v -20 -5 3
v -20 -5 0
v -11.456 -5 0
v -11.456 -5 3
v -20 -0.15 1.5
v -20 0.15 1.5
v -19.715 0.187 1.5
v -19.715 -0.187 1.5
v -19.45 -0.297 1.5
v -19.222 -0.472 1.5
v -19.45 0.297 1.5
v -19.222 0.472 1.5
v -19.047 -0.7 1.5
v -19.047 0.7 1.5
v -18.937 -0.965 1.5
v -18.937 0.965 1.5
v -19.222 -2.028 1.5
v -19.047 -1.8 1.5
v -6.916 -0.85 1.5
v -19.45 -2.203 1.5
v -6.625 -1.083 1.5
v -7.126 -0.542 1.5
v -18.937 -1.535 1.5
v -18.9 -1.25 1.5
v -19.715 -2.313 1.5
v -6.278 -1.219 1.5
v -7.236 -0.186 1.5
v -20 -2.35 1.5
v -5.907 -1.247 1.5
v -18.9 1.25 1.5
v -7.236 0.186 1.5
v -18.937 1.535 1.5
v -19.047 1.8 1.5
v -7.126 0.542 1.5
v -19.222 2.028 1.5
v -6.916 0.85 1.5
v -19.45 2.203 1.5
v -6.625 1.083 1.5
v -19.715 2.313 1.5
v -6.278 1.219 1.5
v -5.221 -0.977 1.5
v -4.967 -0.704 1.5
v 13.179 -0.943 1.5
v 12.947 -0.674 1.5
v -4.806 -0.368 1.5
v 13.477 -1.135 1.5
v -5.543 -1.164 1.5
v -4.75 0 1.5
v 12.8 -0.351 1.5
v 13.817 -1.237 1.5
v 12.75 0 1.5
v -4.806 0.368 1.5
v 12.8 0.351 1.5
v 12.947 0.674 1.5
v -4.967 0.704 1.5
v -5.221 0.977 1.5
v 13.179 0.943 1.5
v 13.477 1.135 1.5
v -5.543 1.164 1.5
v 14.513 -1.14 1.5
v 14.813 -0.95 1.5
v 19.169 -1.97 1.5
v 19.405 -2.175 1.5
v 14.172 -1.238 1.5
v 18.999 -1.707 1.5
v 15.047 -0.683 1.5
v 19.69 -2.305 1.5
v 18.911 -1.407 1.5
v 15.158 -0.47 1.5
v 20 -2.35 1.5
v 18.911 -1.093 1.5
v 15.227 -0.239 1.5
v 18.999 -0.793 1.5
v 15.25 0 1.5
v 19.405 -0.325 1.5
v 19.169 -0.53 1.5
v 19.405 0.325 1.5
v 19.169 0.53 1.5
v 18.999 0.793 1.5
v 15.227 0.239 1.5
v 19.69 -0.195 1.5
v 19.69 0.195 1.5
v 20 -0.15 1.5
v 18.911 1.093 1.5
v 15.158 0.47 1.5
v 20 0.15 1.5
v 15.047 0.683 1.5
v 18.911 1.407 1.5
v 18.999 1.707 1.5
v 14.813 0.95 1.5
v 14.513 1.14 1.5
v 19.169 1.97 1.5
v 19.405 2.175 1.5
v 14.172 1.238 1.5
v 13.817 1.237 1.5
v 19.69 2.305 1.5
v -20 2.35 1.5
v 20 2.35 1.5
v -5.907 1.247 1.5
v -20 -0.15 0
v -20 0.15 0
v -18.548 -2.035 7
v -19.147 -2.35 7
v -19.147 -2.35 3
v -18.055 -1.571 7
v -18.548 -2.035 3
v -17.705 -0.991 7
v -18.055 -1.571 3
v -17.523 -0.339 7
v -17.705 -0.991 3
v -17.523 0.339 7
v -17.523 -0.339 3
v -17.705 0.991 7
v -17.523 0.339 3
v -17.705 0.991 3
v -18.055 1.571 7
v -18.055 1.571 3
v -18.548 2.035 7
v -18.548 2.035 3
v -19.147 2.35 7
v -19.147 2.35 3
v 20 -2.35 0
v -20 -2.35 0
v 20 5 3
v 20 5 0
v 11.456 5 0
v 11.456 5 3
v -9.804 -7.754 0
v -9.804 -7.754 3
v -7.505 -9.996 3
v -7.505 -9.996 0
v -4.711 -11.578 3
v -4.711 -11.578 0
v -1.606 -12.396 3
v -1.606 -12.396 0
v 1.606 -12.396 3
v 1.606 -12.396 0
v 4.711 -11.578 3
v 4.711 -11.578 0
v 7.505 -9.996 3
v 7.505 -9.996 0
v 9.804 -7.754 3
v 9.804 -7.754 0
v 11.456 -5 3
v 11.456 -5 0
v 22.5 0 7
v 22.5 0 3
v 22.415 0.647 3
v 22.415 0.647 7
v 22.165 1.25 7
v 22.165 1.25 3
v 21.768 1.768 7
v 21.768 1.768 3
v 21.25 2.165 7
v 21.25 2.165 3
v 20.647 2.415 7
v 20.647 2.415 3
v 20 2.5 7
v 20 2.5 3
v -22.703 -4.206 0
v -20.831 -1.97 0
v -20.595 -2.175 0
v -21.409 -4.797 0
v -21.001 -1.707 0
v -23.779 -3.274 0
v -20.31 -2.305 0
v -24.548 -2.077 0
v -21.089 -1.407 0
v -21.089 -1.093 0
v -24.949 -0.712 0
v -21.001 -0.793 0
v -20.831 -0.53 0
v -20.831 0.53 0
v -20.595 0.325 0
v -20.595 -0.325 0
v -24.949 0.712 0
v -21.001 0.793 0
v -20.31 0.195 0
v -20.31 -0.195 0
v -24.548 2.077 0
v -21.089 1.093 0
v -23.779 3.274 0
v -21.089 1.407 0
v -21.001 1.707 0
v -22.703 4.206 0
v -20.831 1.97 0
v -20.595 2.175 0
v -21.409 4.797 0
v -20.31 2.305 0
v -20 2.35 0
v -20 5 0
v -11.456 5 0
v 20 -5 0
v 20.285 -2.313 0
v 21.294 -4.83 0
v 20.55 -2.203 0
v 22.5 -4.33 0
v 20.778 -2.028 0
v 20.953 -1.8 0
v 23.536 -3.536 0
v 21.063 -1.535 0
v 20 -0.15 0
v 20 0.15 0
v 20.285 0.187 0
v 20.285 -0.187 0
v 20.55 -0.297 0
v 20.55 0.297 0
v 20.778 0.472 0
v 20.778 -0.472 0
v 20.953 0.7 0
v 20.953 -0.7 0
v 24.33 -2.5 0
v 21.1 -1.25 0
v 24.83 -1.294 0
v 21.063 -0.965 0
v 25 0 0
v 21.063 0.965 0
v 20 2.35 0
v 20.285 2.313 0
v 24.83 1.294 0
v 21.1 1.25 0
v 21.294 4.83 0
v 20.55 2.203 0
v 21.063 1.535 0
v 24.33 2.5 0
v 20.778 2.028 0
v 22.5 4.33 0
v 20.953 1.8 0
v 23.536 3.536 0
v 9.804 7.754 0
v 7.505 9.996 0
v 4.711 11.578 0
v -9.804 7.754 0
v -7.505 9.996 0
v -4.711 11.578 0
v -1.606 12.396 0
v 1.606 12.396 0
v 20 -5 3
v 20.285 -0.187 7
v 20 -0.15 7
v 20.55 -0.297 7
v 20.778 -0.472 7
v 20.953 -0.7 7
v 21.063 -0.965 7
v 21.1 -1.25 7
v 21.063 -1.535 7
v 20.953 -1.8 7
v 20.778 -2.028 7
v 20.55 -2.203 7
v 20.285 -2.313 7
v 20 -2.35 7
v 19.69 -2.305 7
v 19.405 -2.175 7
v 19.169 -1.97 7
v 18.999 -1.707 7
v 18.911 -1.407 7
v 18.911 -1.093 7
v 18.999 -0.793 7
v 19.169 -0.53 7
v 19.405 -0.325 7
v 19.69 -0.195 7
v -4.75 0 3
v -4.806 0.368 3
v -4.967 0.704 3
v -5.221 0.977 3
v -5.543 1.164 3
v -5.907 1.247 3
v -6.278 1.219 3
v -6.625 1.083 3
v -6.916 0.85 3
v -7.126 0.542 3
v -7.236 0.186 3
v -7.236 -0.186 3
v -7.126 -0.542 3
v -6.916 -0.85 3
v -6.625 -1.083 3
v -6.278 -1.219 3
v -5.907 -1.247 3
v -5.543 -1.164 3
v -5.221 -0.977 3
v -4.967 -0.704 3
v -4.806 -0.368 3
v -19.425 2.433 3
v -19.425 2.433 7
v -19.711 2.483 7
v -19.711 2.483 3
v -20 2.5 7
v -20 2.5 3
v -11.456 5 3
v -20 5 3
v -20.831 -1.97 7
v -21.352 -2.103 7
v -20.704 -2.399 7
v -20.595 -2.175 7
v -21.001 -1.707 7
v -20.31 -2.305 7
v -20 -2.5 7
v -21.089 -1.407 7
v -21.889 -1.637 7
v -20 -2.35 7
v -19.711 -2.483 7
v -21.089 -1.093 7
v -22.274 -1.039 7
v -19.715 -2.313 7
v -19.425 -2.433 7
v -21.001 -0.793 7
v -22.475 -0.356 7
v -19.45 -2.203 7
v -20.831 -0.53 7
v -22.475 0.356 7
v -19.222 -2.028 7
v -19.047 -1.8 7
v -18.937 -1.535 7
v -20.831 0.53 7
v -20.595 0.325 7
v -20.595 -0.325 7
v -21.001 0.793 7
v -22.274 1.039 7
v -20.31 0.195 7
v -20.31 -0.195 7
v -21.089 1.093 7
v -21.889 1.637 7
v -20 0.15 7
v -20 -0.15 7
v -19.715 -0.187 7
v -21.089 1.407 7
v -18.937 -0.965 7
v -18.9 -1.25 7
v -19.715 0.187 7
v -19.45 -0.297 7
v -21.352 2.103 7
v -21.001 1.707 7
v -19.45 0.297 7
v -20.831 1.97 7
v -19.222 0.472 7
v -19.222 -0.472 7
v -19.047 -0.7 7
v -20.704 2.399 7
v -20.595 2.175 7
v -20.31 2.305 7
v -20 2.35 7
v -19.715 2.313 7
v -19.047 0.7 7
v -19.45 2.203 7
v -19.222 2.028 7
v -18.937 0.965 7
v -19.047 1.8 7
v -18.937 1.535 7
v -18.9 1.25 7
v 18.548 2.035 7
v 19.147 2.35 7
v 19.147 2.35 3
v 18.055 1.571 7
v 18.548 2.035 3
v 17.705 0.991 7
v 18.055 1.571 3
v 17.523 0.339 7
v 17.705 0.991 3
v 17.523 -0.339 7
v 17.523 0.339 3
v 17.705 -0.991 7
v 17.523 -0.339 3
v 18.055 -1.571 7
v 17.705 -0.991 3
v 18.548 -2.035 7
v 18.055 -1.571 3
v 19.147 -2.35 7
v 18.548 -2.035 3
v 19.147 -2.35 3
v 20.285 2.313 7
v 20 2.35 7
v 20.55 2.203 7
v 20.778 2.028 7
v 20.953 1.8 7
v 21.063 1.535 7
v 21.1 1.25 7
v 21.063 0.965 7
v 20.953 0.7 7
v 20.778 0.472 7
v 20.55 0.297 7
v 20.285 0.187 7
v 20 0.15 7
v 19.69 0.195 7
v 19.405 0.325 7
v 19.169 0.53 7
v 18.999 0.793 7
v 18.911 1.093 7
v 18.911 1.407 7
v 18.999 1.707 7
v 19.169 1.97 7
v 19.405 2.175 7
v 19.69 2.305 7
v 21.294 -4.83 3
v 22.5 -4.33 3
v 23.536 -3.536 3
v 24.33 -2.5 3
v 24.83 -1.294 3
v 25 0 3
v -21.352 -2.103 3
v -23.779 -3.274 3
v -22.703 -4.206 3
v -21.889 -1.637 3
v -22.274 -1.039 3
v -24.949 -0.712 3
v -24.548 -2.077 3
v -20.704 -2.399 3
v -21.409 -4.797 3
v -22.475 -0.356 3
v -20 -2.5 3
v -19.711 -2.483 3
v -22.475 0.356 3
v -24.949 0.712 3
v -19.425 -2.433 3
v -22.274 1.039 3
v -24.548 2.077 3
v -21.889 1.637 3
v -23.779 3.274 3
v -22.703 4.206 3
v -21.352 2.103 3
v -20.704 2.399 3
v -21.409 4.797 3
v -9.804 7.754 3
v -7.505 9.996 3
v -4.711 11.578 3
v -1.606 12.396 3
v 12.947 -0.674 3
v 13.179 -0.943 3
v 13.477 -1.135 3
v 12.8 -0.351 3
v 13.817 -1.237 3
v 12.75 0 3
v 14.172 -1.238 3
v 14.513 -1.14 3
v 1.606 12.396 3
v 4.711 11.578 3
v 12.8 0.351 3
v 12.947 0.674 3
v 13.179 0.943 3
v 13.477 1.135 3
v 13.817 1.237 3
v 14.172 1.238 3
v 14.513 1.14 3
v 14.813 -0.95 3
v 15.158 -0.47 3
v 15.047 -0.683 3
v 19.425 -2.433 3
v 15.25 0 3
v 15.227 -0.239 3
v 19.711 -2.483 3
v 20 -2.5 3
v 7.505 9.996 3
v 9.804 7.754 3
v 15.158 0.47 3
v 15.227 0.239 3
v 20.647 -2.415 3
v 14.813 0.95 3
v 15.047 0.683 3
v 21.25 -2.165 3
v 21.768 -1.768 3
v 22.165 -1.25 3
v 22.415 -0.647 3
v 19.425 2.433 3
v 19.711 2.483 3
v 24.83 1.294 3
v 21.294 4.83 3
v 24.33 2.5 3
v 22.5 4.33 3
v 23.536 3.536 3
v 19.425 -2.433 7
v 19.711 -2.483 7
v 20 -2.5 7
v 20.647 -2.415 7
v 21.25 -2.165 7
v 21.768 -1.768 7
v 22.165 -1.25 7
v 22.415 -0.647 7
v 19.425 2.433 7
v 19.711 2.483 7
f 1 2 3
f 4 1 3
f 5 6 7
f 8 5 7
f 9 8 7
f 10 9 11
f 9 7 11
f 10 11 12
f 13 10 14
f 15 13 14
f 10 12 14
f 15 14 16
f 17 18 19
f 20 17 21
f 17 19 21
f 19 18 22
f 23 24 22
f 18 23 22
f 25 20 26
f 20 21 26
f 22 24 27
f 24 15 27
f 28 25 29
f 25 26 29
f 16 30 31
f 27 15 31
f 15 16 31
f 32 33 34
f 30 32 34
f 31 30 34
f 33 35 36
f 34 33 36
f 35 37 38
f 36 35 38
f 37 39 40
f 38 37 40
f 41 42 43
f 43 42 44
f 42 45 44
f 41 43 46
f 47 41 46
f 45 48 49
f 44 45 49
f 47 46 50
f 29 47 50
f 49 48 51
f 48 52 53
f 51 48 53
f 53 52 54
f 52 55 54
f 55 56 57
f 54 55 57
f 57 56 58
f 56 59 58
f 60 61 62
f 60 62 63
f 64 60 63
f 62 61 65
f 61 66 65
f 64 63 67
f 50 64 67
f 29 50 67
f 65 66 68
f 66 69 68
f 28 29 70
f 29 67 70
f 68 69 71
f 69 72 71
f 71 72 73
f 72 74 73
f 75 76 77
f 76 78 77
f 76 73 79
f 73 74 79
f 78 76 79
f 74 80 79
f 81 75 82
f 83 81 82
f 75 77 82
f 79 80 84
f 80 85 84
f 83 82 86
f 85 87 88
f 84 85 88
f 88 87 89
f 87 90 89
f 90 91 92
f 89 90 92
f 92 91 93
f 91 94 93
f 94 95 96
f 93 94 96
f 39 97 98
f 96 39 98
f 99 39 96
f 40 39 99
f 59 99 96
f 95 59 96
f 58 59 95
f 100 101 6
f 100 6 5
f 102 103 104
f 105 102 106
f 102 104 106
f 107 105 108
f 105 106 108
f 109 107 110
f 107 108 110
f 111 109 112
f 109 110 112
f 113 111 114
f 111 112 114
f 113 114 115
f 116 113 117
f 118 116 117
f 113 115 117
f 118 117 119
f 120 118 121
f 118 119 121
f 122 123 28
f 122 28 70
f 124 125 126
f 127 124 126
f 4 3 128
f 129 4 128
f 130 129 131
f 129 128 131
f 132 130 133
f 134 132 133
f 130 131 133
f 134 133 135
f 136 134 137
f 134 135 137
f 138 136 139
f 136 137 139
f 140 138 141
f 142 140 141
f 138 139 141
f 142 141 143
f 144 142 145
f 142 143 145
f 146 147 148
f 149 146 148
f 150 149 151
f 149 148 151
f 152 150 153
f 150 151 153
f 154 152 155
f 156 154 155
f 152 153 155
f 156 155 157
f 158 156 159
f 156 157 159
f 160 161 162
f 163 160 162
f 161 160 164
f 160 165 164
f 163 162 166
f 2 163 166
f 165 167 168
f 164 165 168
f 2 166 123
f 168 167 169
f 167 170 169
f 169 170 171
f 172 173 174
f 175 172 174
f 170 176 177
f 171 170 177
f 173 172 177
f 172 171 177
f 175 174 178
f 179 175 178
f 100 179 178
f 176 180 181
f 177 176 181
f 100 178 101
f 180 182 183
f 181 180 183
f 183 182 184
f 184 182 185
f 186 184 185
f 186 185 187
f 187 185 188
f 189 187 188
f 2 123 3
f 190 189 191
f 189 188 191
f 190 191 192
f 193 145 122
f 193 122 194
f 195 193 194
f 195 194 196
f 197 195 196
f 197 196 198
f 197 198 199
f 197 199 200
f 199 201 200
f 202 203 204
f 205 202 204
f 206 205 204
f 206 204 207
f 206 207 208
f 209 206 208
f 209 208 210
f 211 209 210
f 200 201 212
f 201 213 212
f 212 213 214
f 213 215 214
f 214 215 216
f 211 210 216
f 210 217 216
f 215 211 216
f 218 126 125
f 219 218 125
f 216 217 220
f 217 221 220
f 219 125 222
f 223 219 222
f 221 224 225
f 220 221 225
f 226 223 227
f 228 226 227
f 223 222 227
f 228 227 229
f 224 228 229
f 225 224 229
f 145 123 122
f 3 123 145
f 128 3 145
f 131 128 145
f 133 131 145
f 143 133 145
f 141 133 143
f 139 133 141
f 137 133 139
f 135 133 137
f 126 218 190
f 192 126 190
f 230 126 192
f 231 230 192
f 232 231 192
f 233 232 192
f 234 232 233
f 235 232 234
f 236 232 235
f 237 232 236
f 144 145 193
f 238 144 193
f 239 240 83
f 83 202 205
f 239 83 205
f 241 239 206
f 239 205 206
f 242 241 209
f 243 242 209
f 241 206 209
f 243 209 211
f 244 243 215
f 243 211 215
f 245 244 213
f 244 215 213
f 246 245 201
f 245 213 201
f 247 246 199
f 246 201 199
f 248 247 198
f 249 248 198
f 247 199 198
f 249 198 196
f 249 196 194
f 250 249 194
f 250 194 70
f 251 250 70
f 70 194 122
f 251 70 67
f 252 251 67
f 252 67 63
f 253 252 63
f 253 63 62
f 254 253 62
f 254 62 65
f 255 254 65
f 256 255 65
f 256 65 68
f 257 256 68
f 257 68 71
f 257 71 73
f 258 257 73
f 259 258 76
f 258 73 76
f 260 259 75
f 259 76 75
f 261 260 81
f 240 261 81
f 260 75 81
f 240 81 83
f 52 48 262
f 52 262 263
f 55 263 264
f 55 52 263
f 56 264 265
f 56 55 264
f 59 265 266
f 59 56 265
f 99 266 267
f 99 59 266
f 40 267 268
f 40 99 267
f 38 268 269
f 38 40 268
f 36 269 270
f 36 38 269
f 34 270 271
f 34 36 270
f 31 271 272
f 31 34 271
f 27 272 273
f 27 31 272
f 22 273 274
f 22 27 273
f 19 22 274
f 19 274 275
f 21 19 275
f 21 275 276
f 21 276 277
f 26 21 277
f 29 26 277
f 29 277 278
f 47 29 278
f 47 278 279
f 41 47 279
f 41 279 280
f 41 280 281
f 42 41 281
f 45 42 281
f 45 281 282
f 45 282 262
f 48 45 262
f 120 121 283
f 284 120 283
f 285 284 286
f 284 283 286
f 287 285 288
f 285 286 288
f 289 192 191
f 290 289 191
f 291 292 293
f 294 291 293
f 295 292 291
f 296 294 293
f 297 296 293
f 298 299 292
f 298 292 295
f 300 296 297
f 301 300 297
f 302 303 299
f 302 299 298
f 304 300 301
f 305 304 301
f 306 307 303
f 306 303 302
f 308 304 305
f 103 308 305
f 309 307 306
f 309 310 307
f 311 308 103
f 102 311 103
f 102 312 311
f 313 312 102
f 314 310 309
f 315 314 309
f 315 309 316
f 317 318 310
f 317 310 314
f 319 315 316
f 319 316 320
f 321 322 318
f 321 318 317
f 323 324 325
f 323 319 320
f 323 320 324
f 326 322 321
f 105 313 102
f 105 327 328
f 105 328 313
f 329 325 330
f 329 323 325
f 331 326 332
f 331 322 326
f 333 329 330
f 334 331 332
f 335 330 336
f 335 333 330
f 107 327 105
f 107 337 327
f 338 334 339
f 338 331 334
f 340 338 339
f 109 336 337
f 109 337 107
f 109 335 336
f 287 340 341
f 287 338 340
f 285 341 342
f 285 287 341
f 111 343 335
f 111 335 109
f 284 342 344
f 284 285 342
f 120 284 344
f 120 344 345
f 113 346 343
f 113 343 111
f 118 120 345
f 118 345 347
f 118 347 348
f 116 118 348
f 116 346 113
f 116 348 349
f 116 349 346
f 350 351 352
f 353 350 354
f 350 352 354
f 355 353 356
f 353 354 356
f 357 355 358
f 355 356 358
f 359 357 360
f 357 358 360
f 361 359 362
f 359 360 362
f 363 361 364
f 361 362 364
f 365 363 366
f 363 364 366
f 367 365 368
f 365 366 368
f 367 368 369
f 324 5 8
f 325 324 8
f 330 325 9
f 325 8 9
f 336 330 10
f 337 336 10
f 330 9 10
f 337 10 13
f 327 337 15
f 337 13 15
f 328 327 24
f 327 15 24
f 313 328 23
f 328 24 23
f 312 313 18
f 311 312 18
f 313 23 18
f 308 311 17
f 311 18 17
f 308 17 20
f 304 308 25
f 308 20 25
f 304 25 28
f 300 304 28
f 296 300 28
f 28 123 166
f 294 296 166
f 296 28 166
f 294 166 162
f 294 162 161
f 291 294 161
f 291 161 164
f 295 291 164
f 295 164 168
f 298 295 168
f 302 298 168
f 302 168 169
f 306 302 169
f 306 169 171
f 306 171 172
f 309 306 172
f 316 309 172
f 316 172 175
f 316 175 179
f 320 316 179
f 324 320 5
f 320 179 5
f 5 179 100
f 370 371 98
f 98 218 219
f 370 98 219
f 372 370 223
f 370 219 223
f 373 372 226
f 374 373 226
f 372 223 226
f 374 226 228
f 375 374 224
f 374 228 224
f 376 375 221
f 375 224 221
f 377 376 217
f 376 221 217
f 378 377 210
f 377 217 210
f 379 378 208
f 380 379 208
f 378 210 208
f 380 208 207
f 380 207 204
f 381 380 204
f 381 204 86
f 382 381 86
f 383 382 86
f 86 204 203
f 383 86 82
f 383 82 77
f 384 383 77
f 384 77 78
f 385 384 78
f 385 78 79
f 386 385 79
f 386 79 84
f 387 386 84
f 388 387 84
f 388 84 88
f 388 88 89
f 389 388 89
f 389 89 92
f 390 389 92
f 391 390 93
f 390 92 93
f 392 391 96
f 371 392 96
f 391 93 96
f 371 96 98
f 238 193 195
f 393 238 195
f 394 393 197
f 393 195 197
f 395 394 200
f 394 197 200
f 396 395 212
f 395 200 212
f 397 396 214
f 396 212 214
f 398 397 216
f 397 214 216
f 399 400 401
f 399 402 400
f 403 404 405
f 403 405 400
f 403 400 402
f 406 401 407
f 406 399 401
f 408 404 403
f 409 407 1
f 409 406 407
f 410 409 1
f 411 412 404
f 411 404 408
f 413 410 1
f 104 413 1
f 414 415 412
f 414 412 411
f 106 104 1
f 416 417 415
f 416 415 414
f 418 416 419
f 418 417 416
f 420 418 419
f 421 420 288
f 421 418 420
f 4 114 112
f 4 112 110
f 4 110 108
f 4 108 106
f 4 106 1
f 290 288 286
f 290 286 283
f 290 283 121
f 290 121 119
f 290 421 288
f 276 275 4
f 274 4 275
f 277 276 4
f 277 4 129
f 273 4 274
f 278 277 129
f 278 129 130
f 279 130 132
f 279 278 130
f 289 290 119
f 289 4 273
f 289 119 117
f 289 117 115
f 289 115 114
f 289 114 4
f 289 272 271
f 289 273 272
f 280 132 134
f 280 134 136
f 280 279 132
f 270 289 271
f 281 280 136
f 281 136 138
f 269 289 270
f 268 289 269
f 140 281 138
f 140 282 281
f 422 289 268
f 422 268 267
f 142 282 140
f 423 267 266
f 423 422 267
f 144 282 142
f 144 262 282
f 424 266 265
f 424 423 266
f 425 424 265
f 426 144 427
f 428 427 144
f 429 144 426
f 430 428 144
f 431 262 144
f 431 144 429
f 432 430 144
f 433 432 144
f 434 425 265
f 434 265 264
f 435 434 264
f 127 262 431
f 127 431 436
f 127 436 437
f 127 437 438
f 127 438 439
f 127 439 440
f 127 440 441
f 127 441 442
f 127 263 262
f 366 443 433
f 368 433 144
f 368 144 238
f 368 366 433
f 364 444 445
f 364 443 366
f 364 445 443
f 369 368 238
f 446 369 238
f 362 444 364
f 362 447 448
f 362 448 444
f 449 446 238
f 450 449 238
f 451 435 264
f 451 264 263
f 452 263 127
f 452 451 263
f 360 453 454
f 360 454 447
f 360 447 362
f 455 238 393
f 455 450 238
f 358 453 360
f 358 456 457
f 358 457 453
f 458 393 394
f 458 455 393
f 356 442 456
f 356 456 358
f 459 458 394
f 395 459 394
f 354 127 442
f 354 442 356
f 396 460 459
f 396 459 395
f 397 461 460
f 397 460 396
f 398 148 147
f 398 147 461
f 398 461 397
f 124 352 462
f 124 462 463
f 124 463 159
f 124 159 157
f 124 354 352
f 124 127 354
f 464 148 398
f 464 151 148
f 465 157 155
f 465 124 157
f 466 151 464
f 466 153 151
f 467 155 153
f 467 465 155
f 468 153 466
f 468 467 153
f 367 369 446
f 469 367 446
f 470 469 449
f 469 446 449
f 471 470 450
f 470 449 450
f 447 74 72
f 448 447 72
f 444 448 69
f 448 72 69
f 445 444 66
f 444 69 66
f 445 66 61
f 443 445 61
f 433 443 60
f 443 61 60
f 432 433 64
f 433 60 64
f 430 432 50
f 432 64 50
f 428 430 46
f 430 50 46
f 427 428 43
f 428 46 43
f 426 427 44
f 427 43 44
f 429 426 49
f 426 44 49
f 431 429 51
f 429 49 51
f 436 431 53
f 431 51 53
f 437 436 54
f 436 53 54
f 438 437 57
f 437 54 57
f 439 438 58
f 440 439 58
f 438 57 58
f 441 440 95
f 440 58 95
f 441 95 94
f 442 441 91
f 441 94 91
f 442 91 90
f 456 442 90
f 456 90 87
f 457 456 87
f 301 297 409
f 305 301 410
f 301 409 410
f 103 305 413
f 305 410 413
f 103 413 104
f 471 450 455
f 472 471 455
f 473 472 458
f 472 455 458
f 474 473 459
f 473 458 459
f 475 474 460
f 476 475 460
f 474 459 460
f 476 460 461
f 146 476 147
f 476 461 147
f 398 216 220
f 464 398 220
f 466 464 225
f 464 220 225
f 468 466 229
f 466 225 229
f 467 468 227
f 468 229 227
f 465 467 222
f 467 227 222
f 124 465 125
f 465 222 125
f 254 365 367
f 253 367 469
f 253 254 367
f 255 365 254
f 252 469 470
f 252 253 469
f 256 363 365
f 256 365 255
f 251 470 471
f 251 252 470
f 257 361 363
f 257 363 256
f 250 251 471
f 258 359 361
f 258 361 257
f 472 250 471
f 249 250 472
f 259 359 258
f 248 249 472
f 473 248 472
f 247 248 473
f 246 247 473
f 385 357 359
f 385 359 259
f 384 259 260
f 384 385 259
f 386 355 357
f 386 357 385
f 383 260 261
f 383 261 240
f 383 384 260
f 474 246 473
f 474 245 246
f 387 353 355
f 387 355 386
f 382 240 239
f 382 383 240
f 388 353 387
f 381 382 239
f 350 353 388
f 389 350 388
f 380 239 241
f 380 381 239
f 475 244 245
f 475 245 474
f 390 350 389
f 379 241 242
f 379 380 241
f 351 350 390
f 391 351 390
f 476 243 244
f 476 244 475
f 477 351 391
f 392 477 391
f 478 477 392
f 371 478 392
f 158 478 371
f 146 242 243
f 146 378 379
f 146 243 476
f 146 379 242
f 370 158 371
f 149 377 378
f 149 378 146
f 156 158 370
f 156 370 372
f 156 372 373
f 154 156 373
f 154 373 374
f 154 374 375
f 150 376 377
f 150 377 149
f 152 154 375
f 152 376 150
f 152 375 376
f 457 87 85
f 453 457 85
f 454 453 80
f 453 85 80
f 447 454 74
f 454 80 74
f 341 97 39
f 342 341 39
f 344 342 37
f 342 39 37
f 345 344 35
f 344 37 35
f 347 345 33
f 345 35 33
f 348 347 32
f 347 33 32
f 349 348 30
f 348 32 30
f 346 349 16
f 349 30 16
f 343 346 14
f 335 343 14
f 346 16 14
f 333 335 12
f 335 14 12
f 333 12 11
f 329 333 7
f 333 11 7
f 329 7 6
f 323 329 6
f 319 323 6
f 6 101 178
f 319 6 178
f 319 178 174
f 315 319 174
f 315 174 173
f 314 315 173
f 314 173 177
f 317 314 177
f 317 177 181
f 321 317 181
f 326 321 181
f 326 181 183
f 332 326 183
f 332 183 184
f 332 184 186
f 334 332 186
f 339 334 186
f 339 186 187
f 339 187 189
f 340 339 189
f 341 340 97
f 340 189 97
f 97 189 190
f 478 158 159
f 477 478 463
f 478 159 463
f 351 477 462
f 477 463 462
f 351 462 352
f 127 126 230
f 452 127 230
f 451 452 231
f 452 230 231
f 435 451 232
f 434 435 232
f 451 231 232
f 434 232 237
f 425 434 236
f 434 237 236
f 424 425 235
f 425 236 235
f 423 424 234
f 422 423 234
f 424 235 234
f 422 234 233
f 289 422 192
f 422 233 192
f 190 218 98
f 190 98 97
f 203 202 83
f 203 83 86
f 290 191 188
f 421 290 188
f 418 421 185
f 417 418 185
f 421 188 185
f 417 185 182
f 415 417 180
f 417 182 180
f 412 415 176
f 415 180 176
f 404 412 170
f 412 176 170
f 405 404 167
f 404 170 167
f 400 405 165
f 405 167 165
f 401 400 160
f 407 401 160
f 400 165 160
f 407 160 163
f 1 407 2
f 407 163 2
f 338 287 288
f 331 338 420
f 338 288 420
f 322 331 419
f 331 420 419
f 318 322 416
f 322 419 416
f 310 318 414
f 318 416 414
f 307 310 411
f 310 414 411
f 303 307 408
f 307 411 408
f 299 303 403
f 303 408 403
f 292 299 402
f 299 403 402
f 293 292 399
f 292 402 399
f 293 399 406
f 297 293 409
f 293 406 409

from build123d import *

# Parameters (mm, degrees)
F0_R     = 1.25
F1_DEPTH = 3
F2_DEPTH = 7
F3_DEPTH = 1.5


# Not quite as in the source:
# - a feature names something its author has since deleted; it is built from what else it names


with BuildPart() as f1:
    # F0 (on Top) → F1 (new body)
    with BuildSketch(Plane.XY):
        with BuildLine():
            ThreePointArc((-15, 0), (-15.1488836144, 1.2110614409), (-15.5866679255, 2.35))
            Line((-15.5866679255, 2.35), (-19.1470638945, 2.35))
            ThreePointArc((-19.1470638945, 2.35), (-17.9527652475, 1.4348623168), (-17.5, 0))
            ThreePointArc((-17.5, 0), (-17.9527652475, -1.4348623168), (-19.1470638945, -2.35))
            Line((-19.1470638945, -2.35), (-15.5866679255, -2.35))
            ThreePointArc((-15.5866679255, -2.35), (-15.1488836144, -1.2110614409), (-15, 0))
        make_face()
        with BuildLine():
            Line((-20, -2.5), (-20, -5))
            ThreePointArc((-20, -5), (-17.4260924648, -4.2866070499), (-15.5866679255, -2.35))
            Line((-15.5866679255, -2.35), (-19.1470638945, -2.35))
            ThreePointArc((-19.1470638945, -2.35), (-19.5669872981, -2.4622144504), (-20, -2.5))
        make_face()
        with BuildLine():
            ThreePointArc((-15.5866679255, 2.35), (-17.4260924648, 4.2866070499), (-20, 5))
            Line((-20, 5), (-20, 2.5))
            ThreePointArc((-20, 2.5), (-19.5669872981, 2.4622144504), (-19.1470638945, 2.35))
            Line((-19.1470638945, 2.35), (-15.5866679255, 2.35))
        make_face()
        with BuildLine():
            Line((-20, 2.35), (-20, 2.5))
            ThreePointArc((-20, 2.5), (-22.5, 0), (-20, -2.5))
            Line((-20, -2.5), (-20, -2.35))
            ThreePointArc((-20, -2.35), (-21.1, -1.25), (-20, -0.15))
            Line((-20, -0.15), (-20, 0.15))
            ThreePointArc((-20, 0.15), (-21.1, 1.25), (-20, 2.35))
        make_face()
        with BuildLine():
            ThreePointArc((-12.2771128528, 2.35), (-11.9405191974, 3.6978373809), (-11.4564392374, 5))
            Line((-11.4564392374, 5), (-20, 5))
            ThreePointArc((-20, 5), (-17.4260924648, 4.2866070499), (-15.5866679255, 2.35))
            Line((-15.5866679255, 2.35), (-12.2771128528, 2.35))
        make_face()
        with BuildLine():
            ThreePointArc((-11.4564392374, -5), (-11.9405191974, -3.6978373809), (-12.2771128528, -2.35))
            Line((-12.2771128528, -2.35), (-15.5866679255, -2.35))
            ThreePointArc((-15.5866679255, -2.35), (-17.4260924648, -4.2866070499), (-20, -5))
            Line((-20, -5), (-11.4564392374, -5))
        make_face()
        with BuildLine():
            ThreePointArc((-12.2771128528, -2.35), (-12.5, 0), (-12.2771128528, 2.35))
            Line((-12.2771128528, 2.35), (-15.5866679255, 2.35))
            ThreePointArc((-15.5866679255, 2.35), (-15.1488836144, 1.2110614409), (-15, 0))
            ThreePointArc((-15, 0), (-15.1488836144, -1.2110614409), (-15.5866679255, -2.35))
            Line((-15.5866679255, -2.35), (-12.2771128528, -2.35))
        make_face()
        with BuildLine():
            Line((-11.4564392374, 2.35), (-11.4564392374, 5))
            ThreePointArc((-11.4564392374, 5), (-11.9405191974, 3.6978373809), (-12.2771128528, 2.35))
            Line((-12.2771128528, 2.35), (-11.4564392374, 2.35))
        make_face()
        with BuildLine():
            Line((-11.4564392374, 2.35), (-12.2771128528, 2.35))
            ThreePointArc((-12.2771128528, 2.35), (-12.5, 0), (-12.2771128528, -2.35))
            Line((-12.2771128528, -2.35), (-11.4564392374, -2.35))
            Line((-11.4564392374, -2.35), (-11.4564392374, -1))
            ThreePointArc((-11.4564392374, -1), (-11.5, 0), (-11.4564392374, 1))
            Line((-11.4564392374, 1), (-11.4564392374, 2.35))
        make_face()
        with BuildLine():
            Line((-11.4564392374, -2.35), (-12.2771128528, -2.35))
            ThreePointArc((-12.2771128528, -2.35), (-11.9405191974, -3.6978373809), (-11.4564392374, -5))
            Line((-11.4564392374, -5), (-11.4564392374, -2.35))
        make_face()
        with BuildLine():
            Line((-11.2573309448, 2.35), (-11.4564392374, 2.35))
            Line((-11.4564392374, 2.35), (-11.4564392374, 1))
            ThreePointArc((-11.4564392374, 1), (-11.3769268246, 1.6779559077), (-11.2573309448, 2.35))
        make_face()
        with BuildLine():
            Line((-11.4564392374, -1), (-11.4564392374, -2.35))
            Line((-11.4564392374, -2.35), (-11.2573309448, -2.35))
            ThreePointArc((-11.2573309448, -2.35), (-11.3769268246, -1.6779559077), (-11.4564392374, -1))
        make_face()
        with BuildLine():
            Line((-11.4564392374, -2.35), (-11.4564392374, -5))
            ThreePointArc((-11.4564392374, -5), (0, -12.5), (11.4564392374, -5))
            Line((11.4564392374, -5), (11.4564392374, -2.35))
            Line((11.4564392374, -2.35), (11.2573309448, -2.35))
            ThreePointArc((11.2573309448, -2.35), (0, -11.5), (-11.2573309448, -2.35))
            Line((-11.2573309448, -2.35), (-11.4564392374, -2.35))
        make_face()
        with BuildLine():
            Line((11.4564392374, 2.35), (11.4564392374, 5))
            ThreePointArc((11.4564392374, 5), (0, 12.5), (-11.4564392374, 5))
            Line((-11.4564392374, 5), (-11.4564392374, 2.35))
            Line((-11.4564392374, 2.35), (-11.2573309448, 2.35))
            ThreePointArc((-11.2573309448, 2.35), (0, 11.5), (11.2573309448, 2.35))
            Line((11.2573309448, 2.35), (11.4564392374, 2.35))
        make_face()
        with BuildLine():
            Line((-11.2573309448, 2.35), (11.2573309448, 2.35))
            ThreePointArc((11.2573309448, 2.35), (0, 11.5), (-11.2573309448, 2.35))
        make_face()
        with BuildLine():
            ThreePointArc((-11.2573309448, -2.35), (0, -11.5), (11.2573309448, -2.35))
            Line((11.2573309448, -2.35), (-11.2573309448, -2.35))
        make_face()
        with BuildLine():
            Line((11.4564392374, -1), (11.4564392374, 1))
            ThreePointArc((11.4564392374, 1), (11.3769268246, 1.6779559077), (11.2573309448, 2.35))
            Line((11.2573309448, 2.35), (-11.2573309448, 2.35))
            ThreePointArc((-11.2573309448, 2.35), (-11.3769268246, 1.6779559077), (-11.4564392374, 1))
            Line((-11.4564392374, 1), (-11.4564392374, -1))
            ThreePointArc((-11.4564392374, -1), (-11.3769268246, -1.6779559077), (-11.2573309448, -2.35))
            Line((-11.2573309448, -2.35), (11.2573309448, -2.35))
            ThreePointArc((11.2573309448, -2.35), (11.3769268246, -1.6779559077), (11.4564392374, -1))
        make_face()
        with Locations((-6, 0)):
            Circle(F0_R, mode=Mode.SUBTRACT)
        with BuildLine():
            Line((11.4564392374, 1), (11.4564392374, 2.35))
            Line((11.4564392374, 2.35), (11.2573309448, 2.35))
            ThreePointArc((11.2573309448, 2.35), (11.3769268246, 1.6779559077), (11.4564392374, 1))
        make_face()
        with BuildLine():
            Line((11.4564392374, -2.35), (11.4564392374, -1))
            ThreePointArc((11.4564392374, -1), (11.3769268246, -1.6779559077), (11.2573309448, -2.35))
            Line((11.2573309448, -2.35), (11.4564392374, -2.35))
        make_face()
        with BuildLine():
            ThreePointArc((11.4564392374, -5), (11.9405191974, -3.6978373809), (12.2771128528, -2.35))
            Line((12.2771128528, -2.35), (11.4564392374, -2.35))
            Line((11.4564392374, -2.35), (11.4564392374, -5))
        make_face()
        with BuildLine():
            ThreePointArc((12.2771128528, 2.35), (11.9405191974, 3.6978373809), (11.4564392374, 5))
            Line((11.4564392374, 5), (11.4564392374, 2.35))
            Line((11.4564392374, 2.35), (12.2771128528, 2.35))
        make_face()
        with BuildLine():
            ThreePointArc((12.5, 0), (12.4441534598, 1.1802731337), (12.2771128528, 2.35))
            Line((12.2771128528, 2.35), (11.4564392374, 2.35))
            Line((11.4564392374, 2.35), (11.4564392374, 1))
            ThreePointArc((11.4564392374, 1), (11.4891046481, 0.5004741602), (11.5, 0))
            ThreePointArc((11.5, 0), (11.4891046481, -0.5004741602), (11.4564392374, -1))
            Line((11.4564392374, -1), (11.4564392374, -2.35))
            Line((11.4564392374, -2.35), (12.2771128528, -2.35))
            ThreePointArc((12.2771128528, -2.35), (12.4441534598, -1.1802731337), (12.5, 0))
        make_face()
        with BuildLine():
            Line((20, 5), (11.4564392374, 5))
            ThreePointArc((11.4564392374, 5), (11.9405191974, 3.6978373809), (12.2771128528, 2.35))
            Line((12.2771128528, 2.35), (15.5866679255, 2.35))
            ThreePointArc((15.5866679255, 2.35), (17.4260924648, 4.2866070499), (20, 5))
        make_face()
        with BuildLine():
            Line((15.5866679255, -2.35), (12.2771128528, -2.35))
            ThreePointArc((12.2771128528, -2.35), (11.9405191974, -3.6978373809), (11.4564392374, -5))
            Line((11.4564392374, -5), (20, -5))
            ThreePointArc((20, -5), (17.4260924648, -4.2866070499), (15.5866679255, -2.35))
        make_face()
        with BuildLine():
            Line((15.5866679255, 2.35), (12.2771128528, 2.35))
            ThreePointArc((12.2771128528, 2.35), (12.4441534598, 1.1802731337), (12.5, 0))
            ThreePointArc((12.5, 0), (12.4441534598, -1.1802731337), (12.2771128528, -2.35))
            Line((12.2771128528, -2.35), (15.5866679255, -2.35))
            ThreePointArc((15.5866679255, -2.35), (15.2431824825, -1.5403529158), (15.046875, -0.6830466561))
            ThreePointArc((15.046875, -0.6830466561), (12.75, 0), (15.046875, 0.6830466561))
            ThreePointArc((15.046875, 0.6830466561), (15.2431824825, 1.5403529158), (15.5866679255, 2.35))
        make_face()
        with BuildLine():
            Line((19.1470638945, 2.35), (15.5866679255, 2.35))
            ThreePointArc((15.5866679255, 2.35), (15.2431824825, 1.5403529158), (15.046875, 0.6830466561))
            ThreePointArc((15.046875, 0.6830466561), (15.1981430945, 0.3563048203), (15.25, 0))
            ThreePointArc((15.25, 0), (15.1981430945, -0.3563048203), (15.046875, -0.6830466561))
            ThreePointArc((15.046875, -0.6830466561), (15.2431824825, -1.5403529158), (15.5866679255, -2.35))
            Line((15.5866679255, -2.35), (19.1470638945, -2.35))
            ThreePointArc((19.1470638945, -2.35), (17.5, 0), (19.1470638945, 2.35))
        make_face()
        with BuildLine():
            Line((20, 2.5), (20, 5))
            ThreePointArc((20, 5), (17.4260924648, 4.2866070499), (15.5866679255, 2.35))
            Line((15.5866679255, 2.35), (19.1470638945, 2.35))
            ThreePointArc((19.1470638945, 2.35), (19.5669872981, 2.4622144504), (20, 2.5))
        make_face()
        with BuildLine():
            ThreePointArc((22.5, 0), (21.767766953, 1.767766953), (20, 2.5))
            Line((20, 2.5), (20, 2.35))
            ThreePointArc((20, 2.35), (20.7778174593, 2.0278174593), (21.1, 1.25))
            ThreePointArc((21.1, 1.25), (20.7778174593, 0.4721825407), (20, 0.15))
            Line((20, 0.15), (20, -0.15))
            ThreePointArc((20, -0.15), (20.7778174593, -0.4721825407), (21.1, -1.25))
            ThreePointArc((21.1, -1.25), (20.7778174593, -2.0278174593), (20, -2.35))
            Line((20, -2.35), (20, -2.5))
            ThreePointArc((20, -2.5), (21.767766953, -1.767766953), (22.5, 0))
        make_face()
        with BuildLine():
            ThreePointArc((15.5866679255, -2.35), (17.4260924648, -4.2866070499), (20, -5))
            Line((20, -5), (20, -2.5))
            ThreePointArc((20, -2.5), (19.5669872981, -2.4622144504), (19.1470638945, -2.35))
            Line((19.1470638945, -2.35), (15.5866679255, -2.35))
        make_face()
        with BuildLine():
            Line((-11.4564392374, -1), (-11.4564392374, 1))
            ThreePointArc((-11.4564392374, 1), (-11.5, 0), (-11.4564392374, -1))
        make_face()
        with BuildLine():
            ThreePointArc((11.5, 0), (11.4891046481, 0.5004741602), (11.4564392374, 1))
            Line((11.4564392374, 1), (11.4564392374, -1))
            ThreePointArc((11.4564392374, -1), (11.4891046481, -0.5004741602), (11.5, 0))
        make_face()
        with BuildLine():
            ThreePointArc((25, 0), (23.5355339059, 3.5355339059), (20, 5))
            Line((20, 5), (20, 2.5))
            ThreePointArc((20, 2.5), (21.767766953, 1.767766953), (22.5, 0))
            ThreePointArc((22.5, 0), (21.767766953, -1.767766953), (20, -2.5))
            Line((20, -2.5), (20, -5))
            ThreePointArc((20, -5), (23.5355339059, -3.5355339059), (25, 0))
        make_face()
        with BuildLine():
            Line((-20, 2.5), (-20, 5))
            ThreePointArc((-20, 5), (-25, 0), (-20, -5))
            Line((-20, -5), (-20, -2.5))
            ThreePointArc((-20, -2.5), (-22.5, 0), (-20, 2.5))
        make_face()
        with BuildLine():
            ThreePointArc((-17.5, 0), (-17.9527652475, 1.4348623168), (-19.1470638945, 2.35))
            Line((-19.1470638945, 2.35), (-20, 2.35))
            ThreePointArc((-20, 2.35), (-19.2221825407, 2.0278174593), (-18.9, 1.25))
            ThreePointArc((-18.9, 1.25), (-19.2221825407, 0.4721825407), (-20, 0.15))
            Line((-20, 0.15), (-20, -0.15))
            ThreePointArc((-20, -0.15), (-19.2221825407, -0.4721825407), (-18.9, -1.25))
            ThreePointArc((-18.9, -1.25), (-19.2221825407, -2.0278174593), (-20, -2.35))
            Line((-20, -2.35), (-19.1470638945, -2.35))
            ThreePointArc((-19.1470638945, -2.35), (-17.9527652475, -1.4348623168), (-17.5, 0))
        make_face()
        with BuildLine():
            Line((-20, -2.35), (-20, -2.5))
            ThreePointArc((-20, -2.5), (-19.5669872981, -2.4622144504), (-19.1470638945, -2.35))
            Line((-19.1470638945, -2.35), (-20, -2.35))
        make_face()
        with BuildLine():
            ThreePointArc((-19.1470638945, 2.35), (-19.5669872981, 2.4622144504), (-20, 2.5))
            Line((-20, 2.5), (-20, 2.35))
            Line((-20, 2.35), (-19.1470638945, 2.35))
        make_face()
        with BuildLine():
            Line((20, 2.35), (19.1470638945, 2.35))
            ThreePointArc((19.1470638945, 2.35), (17.5, 0), (19.1470638945, -2.35))
            Line((19.1470638945, -2.35), (20, -2.35))
            ThreePointArc((20, -2.35), (18.9, -1.25), (20, -0.15))
            Line((20, -0.15), (20, 0.15))
            ThreePointArc((20, 0.15), (18.9, 1.25), (20, 2.35))
        make_face()
        with BuildLine():
            Line((20, 2.35), (20, 2.5))
            ThreePointArc((20, 2.5), (19.5669872981, 2.4622144504), (19.1470638945, 2.35))
            Line((19.1470638945, 2.35), (20, 2.35))
        make_face()
        with BuildLine():
            Line((20, -2.35), (19.1470638945, -2.35))
            ThreePointArc((19.1470638945, -2.35), (19.5669872981, -2.4622144504), (20, -2.5))
            Line((20, -2.5), (20, -2.35))
        make_face()
    extrude(amount=F1_DEPTH)

    # F0 (on Top) → F2 (join)
    with BuildSketch(Plane.XY):
        with BuildLine():
            ThreePointArc((-17.5, 0), (-17.9527652475, 1.4348623168), (-19.1470638945, 2.35))
            Line((-19.1470638945, 2.35), (-20, 2.35))
            ThreePointArc((-20, 2.35), (-19.2221825407, 2.0278174593), (-18.9, 1.25))
            ThreePointArc((-18.9, 1.25), (-19.2221825407, 0.4721825407), (-20, 0.15))
            Line((-20, 0.15), (-20, -0.15))
            ThreePointArc((-20, -0.15), (-19.2221825407, -0.4721825407), (-18.9, -1.25))
            ThreePointArc((-18.9, -1.25), (-19.2221825407, -2.0278174593), (-20, -2.35))
            Line((-20, -2.35), (-19.1470638945, -2.35))
            ThreePointArc((-19.1470638945, -2.35), (-17.9527652475, -1.4348623168), (-17.5, 0))
        make_face()
        with BuildLine():
            Line((-20, -2.35), (-20, -2.5))
            ThreePointArc((-20, -2.5), (-19.5669872981, -2.4622144504), (-19.1470638945, -2.35))
            Line((-19.1470638945, -2.35), (-20, -2.35))
        make_face()
        with BuildLine():
            Line((-20, 2.35), (-20, 2.5))
            ThreePointArc((-20, 2.5), (-22.5, 0), (-20, -2.5))
            Line((-20, -2.5), (-20, -2.35))
            ThreePointArc((-20, -2.35), (-21.1, -1.25), (-20, -0.15))
            Line((-20, -0.15), (-20, 0.15))
            ThreePointArc((-20, 0.15), (-21.1, 1.25), (-20, 2.35))
        make_face()
        with BuildLine():
            ThreePointArc((-19.1470638945, 2.35), (-19.5669872981, 2.4622144504), (-20, 2.5))
            Line((-20, 2.5), (-20, 2.35))
            Line((-20, 2.35), (-19.1470638945, 2.35))
        make_face()
        with BuildLine():
            Line((20, -2.35), (19.1470638945, -2.35))
            ThreePointArc((19.1470638945, -2.35), (19.5669872981, -2.4622144504), (20, -2.5))
            Line((20, -2.5), (20, -2.35))
        make_face()
        with BuildLine():
            Line((20, 2.35), (19.1470638945, 2.35))
            ThreePointArc((19.1470638945, 2.35), (17.5, 0), (19.1470638945, -2.35))
            Line((19.1470638945, -2.35), (20, -2.35))
            ThreePointArc((20, -2.35), (18.9, -1.25), (20, -0.15))
            Line((20, -0.15), (20, 0.15))
            ThreePointArc((20, 0.15), (18.9, 1.25), (20, 2.35))
        make_face()
        with BuildLine():
            ThreePointArc((22.5, 0), (21.767766953, 1.767766953), (20, 2.5))
            Line((20, 2.5), (20, 2.35))
            ThreePointArc((20, 2.35), (20.7778174593, 2.0278174593), (21.1, 1.25))
            ThreePointArc((21.1, 1.25), (20.7778174593, 0.4721825407), (20, 0.15))
            Line((20, 0.15), (20, -0.15))
            ThreePointArc((20, -0.15), (20.7778174593, -0.4721825407), (21.1, -1.25))
            ThreePointArc((21.1, -1.25), (20.7778174593, -2.0278174593), (20, -2.35))
            Line((20, -2.35), (20, -2.5))
            ThreePointArc((20, -2.5), (21.767766953, -1.767766953), (22.5, 0))
        make_face()
        with BuildLine():
            Line((20, 2.35), (20, 2.5))
            ThreePointArc((20, 2.5), (19.5669872981, 2.4622144504), (19.1470638945, 2.35))
            Line((19.1470638945, 2.35), (20, 2.35))
        make_face()
    extrude(amount=F2_DEPTH)


with BuildPart() as f3:
    # F0 (on Top) → F3 (new body)
    with BuildSketch(Plane.XY):
        with BuildLine():
            ThreePointArc((-15, 0), (-15.1488836144, 1.2110614409), (-15.5866679255, 2.35))
            Line((-15.5866679255, 2.35), (-19.1470638945, 2.35))
            ThreePointArc((-19.1470638945, 2.35), (-17.9527652475, 1.4348623168), (-17.5, 0))
            ThreePointArc((-17.5, 0), (-17.9527652475, -1.4348623168), (-19.1470638945, -2.35))
            Line((-19.1470638945, -2.35), (-15.5866679255, -2.35))
            ThreePointArc((-15.5866679255, -2.35), (-15.1488836144, -1.2110614409), (-15, 0))
        make_face()
        with BuildLine():
            ThreePointArc((-12.2771128528, -2.35), (-12.5, 0), (-12.2771128528, 2.35))
            Line((-12.2771128528, 2.35), (-15.5866679255, 2.35))
            ThreePointArc((-15.5866679255, 2.35), (-15.1488836144, 1.2110614409), (-15, 0))
            ThreePointArc((-15, 0), (-15.1488836144, -1.2110614409), (-15.5866679255, -2.35))
            Line((-15.5866679255, -2.35), (-12.2771128528, -2.35))
        make_face()
        with BuildLine():
            Line((-11.4564392374, 2.35), (-12.2771128528, 2.35))
            ThreePointArc((-12.2771128528, 2.35), (-12.5, 0), (-12.2771128528, -2.35))
            Line((-12.2771128528, -2.35), (-11.4564392374, -2.35))
            Line((-11.4564392374, -2.35), (-11.4564392374, -1))
            ThreePointArc((-11.4564392374, -1), (-11.5, 0), (-11.4564392374, 1))
            Line((-11.4564392374, 1), (-11.4564392374, 2.35))
        make_face()
        with BuildLine():
            Line((-11.2573309448, 2.35), (-11.4564392374, 2.35))
            Line((-11.4564392374, 2.35), (-11.4564392374, 1))
            ThreePointArc((-11.4564392374, 1), (-11.3769268246, 1.6779559077), (-11.2573309448, 2.35))
        make_face()
        with BuildLine():
            Line((-11.4564392374, -1), (-11.4564392374, -2.35))
            Line((-11.4564392374, -2.35), (-11.2573309448, -2.35))
            ThreePointArc((-11.2573309448, -2.35), (-11.3769268246, -1.6779559077), (-11.4564392374, -1))
        make_face()
        with BuildLine():
            Line((11.4564392374, -1), (11.4564392374, 1))
            ThreePointArc((11.4564392374, 1), (11.3769268246, 1.6779559077), (11.2573309448, 2.35))
            Line((11.2573309448, 2.35), (-11.2573309448, 2.35))
            ThreePointArc((-11.2573309448, 2.35), (-11.3769268246, 1.6779559077), (-11.4564392374, 1))
            Line((-11.4564392374, 1), (-11.4564392374, -1))
            ThreePointArc((-11.4564392374, -1), (-11.3769268246, -1.6779559077), (-11.2573309448, -2.35))
            Line((-11.2573309448, -2.35), (11.2573309448, -2.35))
            ThreePointArc((11.2573309448, -2.35), (11.3769268246, -1.6779559077), (11.4564392374, -1))
        make_face()
        with Locations((-6, 0)):
            Circle(F0_R, mode=Mode.SUBTRACT)
        with BuildLine():
            Line((11.4564392374, 1), (11.4564392374, 2.35))
            Line((11.4564392374, 2.35), (11.2573309448, 2.35))
            ThreePointArc((11.2573309448, 2.35), (11.3769268246, 1.6779559077), (11.4564392374, 1))
        make_face()
        with BuildLine():
            Line((11.4564392374, -2.35), (11.4564392374, -1))
            ThreePointArc((11.4564392374, -1), (11.3769268246, -1.6779559077), (11.2573309448, -2.35))
            Line((11.2573309448, -2.35), (11.4564392374, -2.35))
        make_face()
        with BuildLine():
            ThreePointArc((12.5, 0), (12.4441534598, 1.1802731337), (12.2771128528, 2.35))
            Line((12.2771128528, 2.35), (11.4564392374, 2.35))
            Line((11.4564392374, 2.35), (11.4564392374, 1))
            ThreePointArc((11.4564392374, 1), (11.4891046481, 0.5004741602), (11.5, 0))
            ThreePointArc((11.5, 0), (11.4891046481, -0.5004741602), (11.4564392374, -1))
            Line((11.4564392374, -1), (11.4564392374, -2.35))
            Line((11.4564392374, -2.35), (12.2771128528, -2.35))
            ThreePointArc((12.2771128528, -2.35), (12.4441534598, -1.1802731337), (12.5, 0))
        make_face()
        with BuildLine():
            Line((15.5866679255, 2.35), (12.2771128528, 2.35))
            ThreePointArc((12.2771128528, 2.35), (12.4441534598, 1.1802731337), (12.5, 0))
            ThreePointArc((12.5, 0), (12.4441534598, -1.1802731337), (12.2771128528, -2.35))
            Line((12.2771128528, -2.35), (15.5866679255, -2.35))
            ThreePointArc((15.5866679255, -2.35), (15.2431824825, -1.5403529158), (15.046875, -0.6830466561))
            ThreePointArc((15.046875, -0.6830466561), (12.75, 0), (15.046875, 0.6830466561))
            ThreePointArc((15.046875, 0.6830466561), (15.2431824825, 1.5403529158), (15.5866679255, 2.35))
        make_face()
        with BuildLine():
            Line((19.1470638945, 2.35), (15.5866679255, 2.35))
            ThreePointArc((15.5866679255, 2.35), (15.2431824825, 1.5403529158), (15.046875, 0.6830466561))
            ThreePointArc((15.046875, 0.6830466561), (15.1981430945, 0.3563048203), (15.25, 0))
            ThreePointArc((15.25, 0), (15.1981430945, -0.3563048203), (15.046875, -0.6830466561))
            ThreePointArc((15.046875, -0.6830466561), (15.2431824825, -1.5403529158), (15.5866679255, -2.35))
            Line((15.5866679255, -2.35), (19.1470638945, -2.35))
            ThreePointArc((19.1470638945, -2.35), (17.5, 0), (19.1470638945, 2.35))
        make_face()
        with BuildLine():
            ThreePointArc((11.5, 0), (11.4891046481, 0.5004741602), (11.4564392374, 1))
            Line((11.4564392374, 1), (11.4564392374, -1))
            ThreePointArc((11.4564392374, -1), (11.4891046481, -0.5004741602), (11.5, 0))
        make_face()
        with BuildLine():
            Line((-11.4564392374, -1), (-11.4564392374, 1))
            ThreePointArc((-11.4564392374, 1), (-11.5, 0), (-11.4564392374, -1))
        make_face()
        with BuildLine():
            ThreePointArc((-17.5, 0), (-17.9527652475, 1.4348623168), (-19.1470638945, 2.35))
            Line((-19.1470638945, 2.35), (-20, 2.35))
            ThreePointArc((-20, 2.35), (-19.2221825407, 2.0278174593), (-18.9, 1.25))
            ThreePointArc((-18.9, 1.25), (-19.2221825407, 0.4721825407), (-20, 0.15))
            Line((-20, 0.15), (-20, -0.15))
            ThreePointArc((-20, -0.15), (-19.2221825407, -0.4721825407), (-18.9, -1.25))
            ThreePointArc((-18.9, -1.25), (-19.2221825407, -2.0278174593), (-20, -2.35))
            Line((-20, -2.35), (-19.1470638945, -2.35))
            ThreePointArc((-19.1470638945, -2.35), (-17.9527652475, -1.4348623168), (-17.5, 0))
        make_face()
        with BuildLine():
            Line((20, 2.35), (19.1470638945, 2.35))
            ThreePointArc((19.1470638945, 2.35), (17.5, 0), (19.1470638945, -2.35))
            Line((19.1470638945, -2.35), (20, -2.35))
            ThreePointArc((20, -2.35), (18.9, -1.25), (20, -0.15))
            Line((20, -0.15), (20, 0.15))
            ThreePointArc((20, 0.15), (18.9, 1.25), (20, 2.35))
        make_face()
    extrude(amount=F3_DEPTH)


with BuildPart() as f1_1:
    add(f1.part)

    # F4: cut F3
    add(f3.part, mode=Mode.SUBTRACT)


solid = f1_1.part
